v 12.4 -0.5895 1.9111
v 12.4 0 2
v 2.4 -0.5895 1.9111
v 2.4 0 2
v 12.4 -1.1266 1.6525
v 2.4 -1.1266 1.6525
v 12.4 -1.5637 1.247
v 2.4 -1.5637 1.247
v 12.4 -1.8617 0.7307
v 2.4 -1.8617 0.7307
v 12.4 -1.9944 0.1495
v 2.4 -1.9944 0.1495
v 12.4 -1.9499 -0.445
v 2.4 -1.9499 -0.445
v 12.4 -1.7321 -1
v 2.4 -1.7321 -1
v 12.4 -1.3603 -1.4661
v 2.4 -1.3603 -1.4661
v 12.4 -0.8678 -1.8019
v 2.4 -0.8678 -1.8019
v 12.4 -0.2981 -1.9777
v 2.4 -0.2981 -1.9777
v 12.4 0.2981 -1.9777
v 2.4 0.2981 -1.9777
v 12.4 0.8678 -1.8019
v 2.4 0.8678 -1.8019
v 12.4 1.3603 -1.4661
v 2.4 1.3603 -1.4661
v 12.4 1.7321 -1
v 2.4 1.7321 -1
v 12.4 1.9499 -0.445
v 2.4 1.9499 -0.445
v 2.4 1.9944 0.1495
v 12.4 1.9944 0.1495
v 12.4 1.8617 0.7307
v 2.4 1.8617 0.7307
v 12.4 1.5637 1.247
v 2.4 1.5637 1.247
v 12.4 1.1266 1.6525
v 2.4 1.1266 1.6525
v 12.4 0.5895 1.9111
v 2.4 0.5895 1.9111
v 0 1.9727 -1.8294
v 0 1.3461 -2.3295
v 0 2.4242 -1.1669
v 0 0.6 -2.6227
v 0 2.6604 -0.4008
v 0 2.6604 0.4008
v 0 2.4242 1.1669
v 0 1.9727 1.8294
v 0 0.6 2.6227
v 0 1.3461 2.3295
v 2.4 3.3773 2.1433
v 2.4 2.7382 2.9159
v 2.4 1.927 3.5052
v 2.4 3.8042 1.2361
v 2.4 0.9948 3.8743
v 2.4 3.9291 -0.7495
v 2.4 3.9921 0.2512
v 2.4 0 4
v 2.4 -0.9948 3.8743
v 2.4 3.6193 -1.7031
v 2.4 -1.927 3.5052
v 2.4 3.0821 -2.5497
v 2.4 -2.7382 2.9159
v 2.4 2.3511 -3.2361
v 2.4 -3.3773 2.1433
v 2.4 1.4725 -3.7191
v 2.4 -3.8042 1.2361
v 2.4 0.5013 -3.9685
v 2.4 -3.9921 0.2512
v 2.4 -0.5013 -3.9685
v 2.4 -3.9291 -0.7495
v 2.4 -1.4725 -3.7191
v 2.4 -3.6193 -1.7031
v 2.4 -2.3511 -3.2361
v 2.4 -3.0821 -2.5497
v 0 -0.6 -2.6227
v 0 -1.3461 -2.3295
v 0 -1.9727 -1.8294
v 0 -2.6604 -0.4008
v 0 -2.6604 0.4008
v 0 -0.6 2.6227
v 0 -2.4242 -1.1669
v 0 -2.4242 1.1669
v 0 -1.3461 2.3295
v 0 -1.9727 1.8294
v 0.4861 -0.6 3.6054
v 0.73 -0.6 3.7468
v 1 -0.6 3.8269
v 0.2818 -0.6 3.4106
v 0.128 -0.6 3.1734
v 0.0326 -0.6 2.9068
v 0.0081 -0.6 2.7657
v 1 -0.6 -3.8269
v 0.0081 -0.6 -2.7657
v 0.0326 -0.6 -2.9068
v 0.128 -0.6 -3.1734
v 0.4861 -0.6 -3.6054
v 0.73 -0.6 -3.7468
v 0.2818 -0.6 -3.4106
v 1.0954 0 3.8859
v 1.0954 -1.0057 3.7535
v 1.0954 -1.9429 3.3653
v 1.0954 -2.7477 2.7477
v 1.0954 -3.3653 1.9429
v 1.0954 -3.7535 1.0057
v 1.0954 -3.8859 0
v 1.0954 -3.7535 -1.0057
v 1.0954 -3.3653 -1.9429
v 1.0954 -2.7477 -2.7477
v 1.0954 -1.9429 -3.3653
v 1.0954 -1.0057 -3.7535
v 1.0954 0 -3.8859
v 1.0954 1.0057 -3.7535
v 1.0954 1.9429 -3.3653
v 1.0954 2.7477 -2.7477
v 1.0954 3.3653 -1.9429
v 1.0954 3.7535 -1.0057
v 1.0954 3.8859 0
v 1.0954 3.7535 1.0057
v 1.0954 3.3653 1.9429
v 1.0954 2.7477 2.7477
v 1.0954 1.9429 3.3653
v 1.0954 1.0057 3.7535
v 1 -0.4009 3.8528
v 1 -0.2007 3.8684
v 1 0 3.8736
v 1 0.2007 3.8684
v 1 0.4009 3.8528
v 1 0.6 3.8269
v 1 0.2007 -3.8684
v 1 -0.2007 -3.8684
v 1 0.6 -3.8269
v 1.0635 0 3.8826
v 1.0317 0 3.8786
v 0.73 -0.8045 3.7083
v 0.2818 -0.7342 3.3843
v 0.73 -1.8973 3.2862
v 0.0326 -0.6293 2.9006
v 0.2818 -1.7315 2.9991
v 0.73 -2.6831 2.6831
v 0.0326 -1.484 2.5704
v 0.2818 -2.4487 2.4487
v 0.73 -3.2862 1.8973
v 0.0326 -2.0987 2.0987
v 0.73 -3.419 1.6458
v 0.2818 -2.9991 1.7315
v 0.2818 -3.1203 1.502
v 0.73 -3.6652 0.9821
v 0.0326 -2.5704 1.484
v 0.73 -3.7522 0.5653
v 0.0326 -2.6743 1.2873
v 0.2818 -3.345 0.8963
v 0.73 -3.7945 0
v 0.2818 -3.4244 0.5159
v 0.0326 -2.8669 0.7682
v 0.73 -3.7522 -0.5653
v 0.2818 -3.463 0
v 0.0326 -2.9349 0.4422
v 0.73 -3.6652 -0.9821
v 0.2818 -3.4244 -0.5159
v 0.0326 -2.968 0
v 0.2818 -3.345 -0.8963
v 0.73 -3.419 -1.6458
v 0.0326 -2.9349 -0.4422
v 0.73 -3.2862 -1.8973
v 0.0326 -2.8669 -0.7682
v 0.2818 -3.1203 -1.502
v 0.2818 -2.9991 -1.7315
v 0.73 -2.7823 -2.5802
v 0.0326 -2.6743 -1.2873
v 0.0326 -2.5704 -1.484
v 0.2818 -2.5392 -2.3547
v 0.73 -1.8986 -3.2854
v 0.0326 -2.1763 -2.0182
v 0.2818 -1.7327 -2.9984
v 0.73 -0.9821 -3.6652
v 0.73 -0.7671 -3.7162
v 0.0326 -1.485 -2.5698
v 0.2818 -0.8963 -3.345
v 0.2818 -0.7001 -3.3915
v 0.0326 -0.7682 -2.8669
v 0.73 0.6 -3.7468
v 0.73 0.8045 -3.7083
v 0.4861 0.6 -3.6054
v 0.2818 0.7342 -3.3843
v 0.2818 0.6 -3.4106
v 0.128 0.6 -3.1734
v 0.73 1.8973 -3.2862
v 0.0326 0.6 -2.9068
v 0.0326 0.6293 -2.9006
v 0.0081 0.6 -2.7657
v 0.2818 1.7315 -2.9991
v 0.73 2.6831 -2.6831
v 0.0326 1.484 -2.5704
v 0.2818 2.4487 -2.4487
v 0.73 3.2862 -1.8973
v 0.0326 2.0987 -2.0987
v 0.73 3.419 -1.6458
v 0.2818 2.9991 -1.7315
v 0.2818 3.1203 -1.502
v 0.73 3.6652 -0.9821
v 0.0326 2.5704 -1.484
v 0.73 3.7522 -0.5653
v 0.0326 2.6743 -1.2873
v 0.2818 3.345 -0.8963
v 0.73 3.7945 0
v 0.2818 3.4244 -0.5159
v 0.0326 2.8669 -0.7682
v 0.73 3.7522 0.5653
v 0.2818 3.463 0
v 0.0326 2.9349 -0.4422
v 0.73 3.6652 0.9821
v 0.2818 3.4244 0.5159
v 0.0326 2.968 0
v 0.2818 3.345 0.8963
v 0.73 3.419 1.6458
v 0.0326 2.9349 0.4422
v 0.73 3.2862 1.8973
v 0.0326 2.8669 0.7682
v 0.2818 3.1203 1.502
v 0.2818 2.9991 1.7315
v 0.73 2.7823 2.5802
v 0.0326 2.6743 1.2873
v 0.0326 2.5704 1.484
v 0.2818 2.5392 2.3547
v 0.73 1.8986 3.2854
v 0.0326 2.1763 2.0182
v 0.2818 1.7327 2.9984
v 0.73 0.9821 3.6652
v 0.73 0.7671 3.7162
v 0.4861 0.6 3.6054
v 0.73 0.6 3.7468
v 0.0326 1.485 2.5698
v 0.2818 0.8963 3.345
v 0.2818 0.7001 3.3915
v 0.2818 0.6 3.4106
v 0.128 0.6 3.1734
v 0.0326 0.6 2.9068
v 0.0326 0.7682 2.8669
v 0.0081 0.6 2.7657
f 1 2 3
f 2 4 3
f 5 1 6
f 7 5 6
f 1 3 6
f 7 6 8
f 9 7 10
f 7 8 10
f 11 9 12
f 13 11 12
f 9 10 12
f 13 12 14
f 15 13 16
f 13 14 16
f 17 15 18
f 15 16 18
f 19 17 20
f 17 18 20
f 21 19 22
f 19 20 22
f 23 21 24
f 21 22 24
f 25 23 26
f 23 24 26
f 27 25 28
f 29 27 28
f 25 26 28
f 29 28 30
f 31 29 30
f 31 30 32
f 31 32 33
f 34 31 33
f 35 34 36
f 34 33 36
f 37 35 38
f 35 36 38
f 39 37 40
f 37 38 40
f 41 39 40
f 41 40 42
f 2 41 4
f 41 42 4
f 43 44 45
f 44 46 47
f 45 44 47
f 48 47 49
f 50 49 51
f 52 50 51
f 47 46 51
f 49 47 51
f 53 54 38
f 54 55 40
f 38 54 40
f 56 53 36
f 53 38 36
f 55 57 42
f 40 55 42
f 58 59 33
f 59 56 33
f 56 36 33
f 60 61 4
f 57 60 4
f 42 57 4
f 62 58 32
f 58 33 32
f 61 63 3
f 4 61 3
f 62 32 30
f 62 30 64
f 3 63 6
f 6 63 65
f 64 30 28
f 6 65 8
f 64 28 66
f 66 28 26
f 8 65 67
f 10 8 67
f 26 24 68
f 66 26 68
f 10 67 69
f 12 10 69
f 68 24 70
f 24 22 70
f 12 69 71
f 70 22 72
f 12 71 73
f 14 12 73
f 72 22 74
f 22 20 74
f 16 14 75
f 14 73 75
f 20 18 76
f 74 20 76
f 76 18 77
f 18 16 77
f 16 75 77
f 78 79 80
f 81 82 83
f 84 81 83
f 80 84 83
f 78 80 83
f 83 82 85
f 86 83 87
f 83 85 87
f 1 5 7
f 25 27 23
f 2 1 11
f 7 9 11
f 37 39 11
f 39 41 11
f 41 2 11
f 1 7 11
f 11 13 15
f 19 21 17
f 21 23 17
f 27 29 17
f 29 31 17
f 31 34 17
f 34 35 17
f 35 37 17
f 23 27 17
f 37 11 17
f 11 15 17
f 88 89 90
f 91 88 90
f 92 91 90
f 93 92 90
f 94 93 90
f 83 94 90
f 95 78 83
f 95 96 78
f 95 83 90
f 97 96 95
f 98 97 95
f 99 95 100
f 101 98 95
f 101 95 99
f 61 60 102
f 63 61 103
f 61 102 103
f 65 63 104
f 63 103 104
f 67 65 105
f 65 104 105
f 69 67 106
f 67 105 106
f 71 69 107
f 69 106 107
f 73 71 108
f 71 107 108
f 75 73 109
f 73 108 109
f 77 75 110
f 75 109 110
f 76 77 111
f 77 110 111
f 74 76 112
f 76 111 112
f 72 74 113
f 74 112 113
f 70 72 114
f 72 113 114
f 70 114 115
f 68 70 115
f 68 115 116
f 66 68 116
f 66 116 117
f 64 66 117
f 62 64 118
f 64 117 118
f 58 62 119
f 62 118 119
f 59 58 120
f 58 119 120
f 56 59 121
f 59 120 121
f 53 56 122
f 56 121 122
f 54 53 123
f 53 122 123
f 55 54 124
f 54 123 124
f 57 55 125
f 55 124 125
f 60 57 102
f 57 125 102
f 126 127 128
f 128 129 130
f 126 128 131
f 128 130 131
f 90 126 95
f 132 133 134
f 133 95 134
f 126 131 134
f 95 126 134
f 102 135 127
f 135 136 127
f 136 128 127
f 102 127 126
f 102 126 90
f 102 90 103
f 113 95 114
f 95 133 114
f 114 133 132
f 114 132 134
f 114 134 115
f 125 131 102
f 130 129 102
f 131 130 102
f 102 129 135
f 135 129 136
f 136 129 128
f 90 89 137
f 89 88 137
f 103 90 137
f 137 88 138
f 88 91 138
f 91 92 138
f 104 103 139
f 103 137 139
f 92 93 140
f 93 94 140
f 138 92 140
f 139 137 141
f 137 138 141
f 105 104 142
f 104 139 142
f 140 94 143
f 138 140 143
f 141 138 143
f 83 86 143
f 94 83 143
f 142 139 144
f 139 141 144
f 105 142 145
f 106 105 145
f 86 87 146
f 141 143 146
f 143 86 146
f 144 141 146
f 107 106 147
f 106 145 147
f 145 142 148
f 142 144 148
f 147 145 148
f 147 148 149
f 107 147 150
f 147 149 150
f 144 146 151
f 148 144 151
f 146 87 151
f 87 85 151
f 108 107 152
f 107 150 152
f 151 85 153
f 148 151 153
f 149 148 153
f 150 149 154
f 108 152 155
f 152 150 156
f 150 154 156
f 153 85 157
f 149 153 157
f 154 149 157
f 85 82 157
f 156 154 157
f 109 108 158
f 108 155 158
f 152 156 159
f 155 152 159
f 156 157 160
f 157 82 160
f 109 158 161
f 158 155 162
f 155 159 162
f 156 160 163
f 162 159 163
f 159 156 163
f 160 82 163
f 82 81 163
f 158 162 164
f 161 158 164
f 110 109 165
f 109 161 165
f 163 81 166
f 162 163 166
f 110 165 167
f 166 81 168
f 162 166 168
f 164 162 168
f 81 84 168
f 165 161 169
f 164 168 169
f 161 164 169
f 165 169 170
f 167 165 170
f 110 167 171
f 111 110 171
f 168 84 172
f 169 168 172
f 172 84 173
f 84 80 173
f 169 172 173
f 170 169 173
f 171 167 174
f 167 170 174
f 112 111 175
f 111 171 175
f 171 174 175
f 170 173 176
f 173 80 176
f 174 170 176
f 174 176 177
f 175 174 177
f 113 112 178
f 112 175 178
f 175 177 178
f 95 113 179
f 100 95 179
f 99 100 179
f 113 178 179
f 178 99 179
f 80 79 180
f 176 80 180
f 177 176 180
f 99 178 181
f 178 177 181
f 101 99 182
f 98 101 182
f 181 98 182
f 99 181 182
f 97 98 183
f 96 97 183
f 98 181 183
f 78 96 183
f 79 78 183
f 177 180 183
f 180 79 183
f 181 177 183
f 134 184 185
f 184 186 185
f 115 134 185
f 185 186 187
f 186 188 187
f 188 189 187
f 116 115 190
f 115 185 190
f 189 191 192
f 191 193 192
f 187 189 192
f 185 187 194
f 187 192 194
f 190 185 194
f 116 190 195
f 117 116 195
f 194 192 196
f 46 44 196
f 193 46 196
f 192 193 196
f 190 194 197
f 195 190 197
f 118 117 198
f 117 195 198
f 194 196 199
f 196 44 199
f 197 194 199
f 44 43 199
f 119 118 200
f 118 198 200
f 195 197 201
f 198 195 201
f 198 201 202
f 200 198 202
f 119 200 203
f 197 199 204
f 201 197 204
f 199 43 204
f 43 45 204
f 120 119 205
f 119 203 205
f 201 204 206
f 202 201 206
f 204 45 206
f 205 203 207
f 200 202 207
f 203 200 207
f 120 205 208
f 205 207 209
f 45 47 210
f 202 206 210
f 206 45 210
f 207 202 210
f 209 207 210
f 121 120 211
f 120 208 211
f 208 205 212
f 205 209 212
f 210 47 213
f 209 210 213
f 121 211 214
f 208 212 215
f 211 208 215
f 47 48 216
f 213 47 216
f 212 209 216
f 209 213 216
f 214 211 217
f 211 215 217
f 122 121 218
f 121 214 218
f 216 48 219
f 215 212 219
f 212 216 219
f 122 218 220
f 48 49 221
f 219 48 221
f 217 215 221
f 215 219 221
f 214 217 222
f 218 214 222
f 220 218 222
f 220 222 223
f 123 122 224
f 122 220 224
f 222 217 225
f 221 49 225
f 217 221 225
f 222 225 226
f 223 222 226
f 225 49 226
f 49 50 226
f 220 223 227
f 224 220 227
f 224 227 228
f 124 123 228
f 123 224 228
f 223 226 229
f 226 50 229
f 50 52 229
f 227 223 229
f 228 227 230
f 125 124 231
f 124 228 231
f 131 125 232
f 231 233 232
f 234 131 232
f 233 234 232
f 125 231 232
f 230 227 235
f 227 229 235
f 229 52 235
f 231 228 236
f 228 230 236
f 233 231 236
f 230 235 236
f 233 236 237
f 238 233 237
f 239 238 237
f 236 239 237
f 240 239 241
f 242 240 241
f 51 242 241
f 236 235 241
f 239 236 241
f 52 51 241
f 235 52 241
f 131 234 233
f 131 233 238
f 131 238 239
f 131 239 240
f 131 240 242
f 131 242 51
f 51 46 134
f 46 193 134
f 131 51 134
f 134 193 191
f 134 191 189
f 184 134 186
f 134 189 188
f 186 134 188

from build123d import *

# Parameters (mm, degrees)
FILLET2_R  = 1.2
SKETCH2_W  = 8
SKETCH2_H  = 1.2
SLOT_DEPTH = 1


with BuildPart() as part:
    # BodySke → Base-Revolve (revolve)
    with BuildSketch(Plane.XY, mode=Mode.PRIVATE) as base_revolve_sk:
        Polygon((2.4, 2), (2.4, 4), (0, 3.790027208), (0, 0), (12.4, 0), (12.4, 2), align=None)
    revolve(base_revolve_sk.sketch.rotate(Axis((-25.4, 0, 0), (1, 0, 0)), 90), axis=Axis((-25.4, 0, 0), (1, 0, 0)))  # turned: the seam where the file's is

    # Fillet2
    fillet2_edges = [part.edges().sort_by_distance(p)[0] for p in [
        (0, 0, -3.790027208),
    ]]
    fillet(fillet2_edges, radius=FILLET2_R)

    # Sketch2 → Slot (cut)
    with BuildSketch(Plane(origin=(0, 0, 0), x_dir=(0, 0, -1), z_dir=(1, 0, 0))):
        Rectangle(SKETCH2_W, SKETCH2_H)
    extrude(amount=SLOT_DEPTH, mode=Mode.SUBTRACT)


solid = part.part
